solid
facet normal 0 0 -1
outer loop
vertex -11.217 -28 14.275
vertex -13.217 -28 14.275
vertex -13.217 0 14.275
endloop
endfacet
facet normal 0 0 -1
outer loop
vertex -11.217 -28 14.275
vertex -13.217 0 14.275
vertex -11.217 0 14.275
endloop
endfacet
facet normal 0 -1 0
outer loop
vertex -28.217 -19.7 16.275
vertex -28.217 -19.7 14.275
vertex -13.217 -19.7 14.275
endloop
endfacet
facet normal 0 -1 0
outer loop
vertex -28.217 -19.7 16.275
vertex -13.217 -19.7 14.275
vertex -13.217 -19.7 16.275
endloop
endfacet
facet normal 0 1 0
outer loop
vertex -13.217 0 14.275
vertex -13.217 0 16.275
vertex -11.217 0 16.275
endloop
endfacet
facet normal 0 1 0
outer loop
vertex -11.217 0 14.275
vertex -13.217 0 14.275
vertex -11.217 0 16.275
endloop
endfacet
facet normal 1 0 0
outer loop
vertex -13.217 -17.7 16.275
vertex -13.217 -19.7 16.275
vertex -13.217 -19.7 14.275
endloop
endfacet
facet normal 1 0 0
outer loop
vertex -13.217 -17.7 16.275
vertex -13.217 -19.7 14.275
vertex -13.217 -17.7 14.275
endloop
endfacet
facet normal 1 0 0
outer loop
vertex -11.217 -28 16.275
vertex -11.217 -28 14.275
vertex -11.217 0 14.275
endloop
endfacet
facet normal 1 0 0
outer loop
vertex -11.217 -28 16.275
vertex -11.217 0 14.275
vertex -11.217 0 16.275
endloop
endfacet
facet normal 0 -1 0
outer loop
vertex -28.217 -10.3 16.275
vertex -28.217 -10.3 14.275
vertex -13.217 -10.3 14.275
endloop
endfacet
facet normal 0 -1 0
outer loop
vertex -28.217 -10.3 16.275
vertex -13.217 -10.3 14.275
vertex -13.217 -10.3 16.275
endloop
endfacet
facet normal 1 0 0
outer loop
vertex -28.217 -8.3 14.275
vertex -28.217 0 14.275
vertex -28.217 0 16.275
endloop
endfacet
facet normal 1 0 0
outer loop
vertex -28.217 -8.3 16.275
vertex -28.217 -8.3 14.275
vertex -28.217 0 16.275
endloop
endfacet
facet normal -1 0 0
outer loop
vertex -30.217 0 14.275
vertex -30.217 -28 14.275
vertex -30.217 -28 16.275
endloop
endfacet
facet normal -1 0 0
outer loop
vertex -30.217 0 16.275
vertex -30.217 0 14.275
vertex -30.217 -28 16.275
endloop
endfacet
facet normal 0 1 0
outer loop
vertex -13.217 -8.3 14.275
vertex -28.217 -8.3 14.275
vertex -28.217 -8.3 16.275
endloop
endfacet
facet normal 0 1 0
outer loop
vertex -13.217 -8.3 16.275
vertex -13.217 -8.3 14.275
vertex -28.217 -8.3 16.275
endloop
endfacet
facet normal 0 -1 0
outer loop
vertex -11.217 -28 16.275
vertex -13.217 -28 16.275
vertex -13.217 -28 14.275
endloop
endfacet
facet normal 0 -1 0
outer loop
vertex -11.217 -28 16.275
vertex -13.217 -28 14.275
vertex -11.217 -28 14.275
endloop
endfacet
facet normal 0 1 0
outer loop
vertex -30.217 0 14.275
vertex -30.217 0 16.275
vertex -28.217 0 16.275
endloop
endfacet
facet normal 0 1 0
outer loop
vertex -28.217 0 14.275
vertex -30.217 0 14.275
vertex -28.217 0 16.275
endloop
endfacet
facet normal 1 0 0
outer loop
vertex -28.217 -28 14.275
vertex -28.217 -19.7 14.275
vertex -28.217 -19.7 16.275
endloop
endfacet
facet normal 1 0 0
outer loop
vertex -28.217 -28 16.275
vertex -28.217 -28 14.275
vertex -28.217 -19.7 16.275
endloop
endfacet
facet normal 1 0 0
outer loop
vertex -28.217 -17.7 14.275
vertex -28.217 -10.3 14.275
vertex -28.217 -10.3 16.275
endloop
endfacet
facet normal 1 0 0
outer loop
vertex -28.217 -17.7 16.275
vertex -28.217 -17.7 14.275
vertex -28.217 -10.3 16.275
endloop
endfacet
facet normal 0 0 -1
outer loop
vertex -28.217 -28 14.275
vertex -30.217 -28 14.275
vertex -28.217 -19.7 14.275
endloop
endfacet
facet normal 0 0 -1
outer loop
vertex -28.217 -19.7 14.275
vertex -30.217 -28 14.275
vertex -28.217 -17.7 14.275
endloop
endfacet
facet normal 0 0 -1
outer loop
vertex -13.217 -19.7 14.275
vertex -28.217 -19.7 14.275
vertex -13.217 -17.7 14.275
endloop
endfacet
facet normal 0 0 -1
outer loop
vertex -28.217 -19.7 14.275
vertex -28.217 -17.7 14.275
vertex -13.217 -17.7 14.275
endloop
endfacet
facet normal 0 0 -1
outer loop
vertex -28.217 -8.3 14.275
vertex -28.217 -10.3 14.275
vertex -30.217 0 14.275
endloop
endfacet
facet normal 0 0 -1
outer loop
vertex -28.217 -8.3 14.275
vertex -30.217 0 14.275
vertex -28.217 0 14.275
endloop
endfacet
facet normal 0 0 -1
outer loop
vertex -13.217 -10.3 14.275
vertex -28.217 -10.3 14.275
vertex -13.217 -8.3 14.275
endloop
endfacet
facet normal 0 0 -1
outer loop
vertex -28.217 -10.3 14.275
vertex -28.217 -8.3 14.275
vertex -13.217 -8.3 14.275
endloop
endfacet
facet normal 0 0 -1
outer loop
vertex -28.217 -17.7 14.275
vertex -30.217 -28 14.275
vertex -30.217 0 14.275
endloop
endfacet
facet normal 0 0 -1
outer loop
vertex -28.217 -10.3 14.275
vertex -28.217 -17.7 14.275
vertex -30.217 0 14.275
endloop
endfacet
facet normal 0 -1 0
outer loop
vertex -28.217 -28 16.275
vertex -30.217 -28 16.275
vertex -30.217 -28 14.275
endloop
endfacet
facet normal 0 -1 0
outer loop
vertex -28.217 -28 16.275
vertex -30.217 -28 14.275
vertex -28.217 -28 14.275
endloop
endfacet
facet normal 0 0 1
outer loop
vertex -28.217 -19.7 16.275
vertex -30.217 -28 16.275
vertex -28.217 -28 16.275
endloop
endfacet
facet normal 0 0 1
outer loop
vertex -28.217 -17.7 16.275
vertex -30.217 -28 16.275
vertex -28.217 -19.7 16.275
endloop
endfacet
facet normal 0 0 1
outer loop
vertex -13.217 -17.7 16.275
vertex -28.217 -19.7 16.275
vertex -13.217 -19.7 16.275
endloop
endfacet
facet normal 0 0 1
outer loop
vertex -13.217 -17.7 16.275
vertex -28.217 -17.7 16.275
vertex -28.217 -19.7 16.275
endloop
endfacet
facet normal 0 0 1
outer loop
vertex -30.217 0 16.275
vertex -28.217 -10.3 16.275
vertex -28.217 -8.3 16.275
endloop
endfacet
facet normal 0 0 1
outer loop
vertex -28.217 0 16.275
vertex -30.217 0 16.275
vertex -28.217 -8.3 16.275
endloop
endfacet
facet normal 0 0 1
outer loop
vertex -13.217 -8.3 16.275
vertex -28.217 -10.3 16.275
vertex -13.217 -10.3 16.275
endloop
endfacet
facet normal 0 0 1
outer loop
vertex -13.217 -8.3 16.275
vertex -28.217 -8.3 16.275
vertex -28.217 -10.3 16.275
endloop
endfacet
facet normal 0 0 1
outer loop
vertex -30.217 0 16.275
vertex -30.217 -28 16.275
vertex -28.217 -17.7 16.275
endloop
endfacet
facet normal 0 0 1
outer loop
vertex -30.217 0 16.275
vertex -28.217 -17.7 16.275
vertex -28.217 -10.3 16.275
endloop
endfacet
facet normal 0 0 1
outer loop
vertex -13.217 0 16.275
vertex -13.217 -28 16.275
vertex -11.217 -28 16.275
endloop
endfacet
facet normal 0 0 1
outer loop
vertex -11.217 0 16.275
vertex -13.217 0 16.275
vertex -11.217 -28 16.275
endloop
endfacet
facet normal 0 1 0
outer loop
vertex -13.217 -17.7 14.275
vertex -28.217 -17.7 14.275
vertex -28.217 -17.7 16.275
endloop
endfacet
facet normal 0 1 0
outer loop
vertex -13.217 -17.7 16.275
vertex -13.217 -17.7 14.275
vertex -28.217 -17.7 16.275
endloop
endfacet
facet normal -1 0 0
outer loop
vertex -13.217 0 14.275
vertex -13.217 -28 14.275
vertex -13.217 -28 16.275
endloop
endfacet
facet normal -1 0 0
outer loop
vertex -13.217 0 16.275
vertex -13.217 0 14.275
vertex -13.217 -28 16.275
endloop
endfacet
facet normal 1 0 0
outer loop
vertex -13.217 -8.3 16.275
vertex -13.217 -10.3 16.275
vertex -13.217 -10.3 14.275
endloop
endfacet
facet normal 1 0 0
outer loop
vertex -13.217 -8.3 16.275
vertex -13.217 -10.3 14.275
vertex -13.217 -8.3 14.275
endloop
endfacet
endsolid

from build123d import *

# Parameters (mm, degrees)
F0_W     = 2
F0_H     = 2
F1_DEPTH = 28
F2_W     = 2
F2_H     = 2
F3_DEPTH = 15


# Not quite as in the source:
# - a feature names something its author has since deleted; it is built from what else it names


with BuildPart() as f1:
    # F0 (on Front) → F1 (new body)
    with BuildSketch(Plane.XZ):
        with Locations((-29.2174071148, 15.274727294)):
            Rectangle(F0_W, F0_H)
    extrude(amount=F1_DEPTH)

    # F2 (on face) → F3 (join)
    with BuildSketch(Plane.YZ.offset(-28.2174071148)):
        with Locations((-18.7, 15.274727294)):
            Rectangle(F2_W, F2_H)
        with Locations((-9.3, 15.274727294)):
            Rectangle(F2_W, F2_H)
    extrude(amount=F3_DEPTH)


with BuildPart() as f1b:
    # F0 (on Front) → F1, piece 2 (new body)
    with BuildSketch(Plane.XZ):
        with Locations((-12.2174071148, 15.274727294)):
            Rectangle(F0_W, F0_H)
    extrude(amount=F1_DEPTH)


solid = Compound([f1.part, f1b.part])
